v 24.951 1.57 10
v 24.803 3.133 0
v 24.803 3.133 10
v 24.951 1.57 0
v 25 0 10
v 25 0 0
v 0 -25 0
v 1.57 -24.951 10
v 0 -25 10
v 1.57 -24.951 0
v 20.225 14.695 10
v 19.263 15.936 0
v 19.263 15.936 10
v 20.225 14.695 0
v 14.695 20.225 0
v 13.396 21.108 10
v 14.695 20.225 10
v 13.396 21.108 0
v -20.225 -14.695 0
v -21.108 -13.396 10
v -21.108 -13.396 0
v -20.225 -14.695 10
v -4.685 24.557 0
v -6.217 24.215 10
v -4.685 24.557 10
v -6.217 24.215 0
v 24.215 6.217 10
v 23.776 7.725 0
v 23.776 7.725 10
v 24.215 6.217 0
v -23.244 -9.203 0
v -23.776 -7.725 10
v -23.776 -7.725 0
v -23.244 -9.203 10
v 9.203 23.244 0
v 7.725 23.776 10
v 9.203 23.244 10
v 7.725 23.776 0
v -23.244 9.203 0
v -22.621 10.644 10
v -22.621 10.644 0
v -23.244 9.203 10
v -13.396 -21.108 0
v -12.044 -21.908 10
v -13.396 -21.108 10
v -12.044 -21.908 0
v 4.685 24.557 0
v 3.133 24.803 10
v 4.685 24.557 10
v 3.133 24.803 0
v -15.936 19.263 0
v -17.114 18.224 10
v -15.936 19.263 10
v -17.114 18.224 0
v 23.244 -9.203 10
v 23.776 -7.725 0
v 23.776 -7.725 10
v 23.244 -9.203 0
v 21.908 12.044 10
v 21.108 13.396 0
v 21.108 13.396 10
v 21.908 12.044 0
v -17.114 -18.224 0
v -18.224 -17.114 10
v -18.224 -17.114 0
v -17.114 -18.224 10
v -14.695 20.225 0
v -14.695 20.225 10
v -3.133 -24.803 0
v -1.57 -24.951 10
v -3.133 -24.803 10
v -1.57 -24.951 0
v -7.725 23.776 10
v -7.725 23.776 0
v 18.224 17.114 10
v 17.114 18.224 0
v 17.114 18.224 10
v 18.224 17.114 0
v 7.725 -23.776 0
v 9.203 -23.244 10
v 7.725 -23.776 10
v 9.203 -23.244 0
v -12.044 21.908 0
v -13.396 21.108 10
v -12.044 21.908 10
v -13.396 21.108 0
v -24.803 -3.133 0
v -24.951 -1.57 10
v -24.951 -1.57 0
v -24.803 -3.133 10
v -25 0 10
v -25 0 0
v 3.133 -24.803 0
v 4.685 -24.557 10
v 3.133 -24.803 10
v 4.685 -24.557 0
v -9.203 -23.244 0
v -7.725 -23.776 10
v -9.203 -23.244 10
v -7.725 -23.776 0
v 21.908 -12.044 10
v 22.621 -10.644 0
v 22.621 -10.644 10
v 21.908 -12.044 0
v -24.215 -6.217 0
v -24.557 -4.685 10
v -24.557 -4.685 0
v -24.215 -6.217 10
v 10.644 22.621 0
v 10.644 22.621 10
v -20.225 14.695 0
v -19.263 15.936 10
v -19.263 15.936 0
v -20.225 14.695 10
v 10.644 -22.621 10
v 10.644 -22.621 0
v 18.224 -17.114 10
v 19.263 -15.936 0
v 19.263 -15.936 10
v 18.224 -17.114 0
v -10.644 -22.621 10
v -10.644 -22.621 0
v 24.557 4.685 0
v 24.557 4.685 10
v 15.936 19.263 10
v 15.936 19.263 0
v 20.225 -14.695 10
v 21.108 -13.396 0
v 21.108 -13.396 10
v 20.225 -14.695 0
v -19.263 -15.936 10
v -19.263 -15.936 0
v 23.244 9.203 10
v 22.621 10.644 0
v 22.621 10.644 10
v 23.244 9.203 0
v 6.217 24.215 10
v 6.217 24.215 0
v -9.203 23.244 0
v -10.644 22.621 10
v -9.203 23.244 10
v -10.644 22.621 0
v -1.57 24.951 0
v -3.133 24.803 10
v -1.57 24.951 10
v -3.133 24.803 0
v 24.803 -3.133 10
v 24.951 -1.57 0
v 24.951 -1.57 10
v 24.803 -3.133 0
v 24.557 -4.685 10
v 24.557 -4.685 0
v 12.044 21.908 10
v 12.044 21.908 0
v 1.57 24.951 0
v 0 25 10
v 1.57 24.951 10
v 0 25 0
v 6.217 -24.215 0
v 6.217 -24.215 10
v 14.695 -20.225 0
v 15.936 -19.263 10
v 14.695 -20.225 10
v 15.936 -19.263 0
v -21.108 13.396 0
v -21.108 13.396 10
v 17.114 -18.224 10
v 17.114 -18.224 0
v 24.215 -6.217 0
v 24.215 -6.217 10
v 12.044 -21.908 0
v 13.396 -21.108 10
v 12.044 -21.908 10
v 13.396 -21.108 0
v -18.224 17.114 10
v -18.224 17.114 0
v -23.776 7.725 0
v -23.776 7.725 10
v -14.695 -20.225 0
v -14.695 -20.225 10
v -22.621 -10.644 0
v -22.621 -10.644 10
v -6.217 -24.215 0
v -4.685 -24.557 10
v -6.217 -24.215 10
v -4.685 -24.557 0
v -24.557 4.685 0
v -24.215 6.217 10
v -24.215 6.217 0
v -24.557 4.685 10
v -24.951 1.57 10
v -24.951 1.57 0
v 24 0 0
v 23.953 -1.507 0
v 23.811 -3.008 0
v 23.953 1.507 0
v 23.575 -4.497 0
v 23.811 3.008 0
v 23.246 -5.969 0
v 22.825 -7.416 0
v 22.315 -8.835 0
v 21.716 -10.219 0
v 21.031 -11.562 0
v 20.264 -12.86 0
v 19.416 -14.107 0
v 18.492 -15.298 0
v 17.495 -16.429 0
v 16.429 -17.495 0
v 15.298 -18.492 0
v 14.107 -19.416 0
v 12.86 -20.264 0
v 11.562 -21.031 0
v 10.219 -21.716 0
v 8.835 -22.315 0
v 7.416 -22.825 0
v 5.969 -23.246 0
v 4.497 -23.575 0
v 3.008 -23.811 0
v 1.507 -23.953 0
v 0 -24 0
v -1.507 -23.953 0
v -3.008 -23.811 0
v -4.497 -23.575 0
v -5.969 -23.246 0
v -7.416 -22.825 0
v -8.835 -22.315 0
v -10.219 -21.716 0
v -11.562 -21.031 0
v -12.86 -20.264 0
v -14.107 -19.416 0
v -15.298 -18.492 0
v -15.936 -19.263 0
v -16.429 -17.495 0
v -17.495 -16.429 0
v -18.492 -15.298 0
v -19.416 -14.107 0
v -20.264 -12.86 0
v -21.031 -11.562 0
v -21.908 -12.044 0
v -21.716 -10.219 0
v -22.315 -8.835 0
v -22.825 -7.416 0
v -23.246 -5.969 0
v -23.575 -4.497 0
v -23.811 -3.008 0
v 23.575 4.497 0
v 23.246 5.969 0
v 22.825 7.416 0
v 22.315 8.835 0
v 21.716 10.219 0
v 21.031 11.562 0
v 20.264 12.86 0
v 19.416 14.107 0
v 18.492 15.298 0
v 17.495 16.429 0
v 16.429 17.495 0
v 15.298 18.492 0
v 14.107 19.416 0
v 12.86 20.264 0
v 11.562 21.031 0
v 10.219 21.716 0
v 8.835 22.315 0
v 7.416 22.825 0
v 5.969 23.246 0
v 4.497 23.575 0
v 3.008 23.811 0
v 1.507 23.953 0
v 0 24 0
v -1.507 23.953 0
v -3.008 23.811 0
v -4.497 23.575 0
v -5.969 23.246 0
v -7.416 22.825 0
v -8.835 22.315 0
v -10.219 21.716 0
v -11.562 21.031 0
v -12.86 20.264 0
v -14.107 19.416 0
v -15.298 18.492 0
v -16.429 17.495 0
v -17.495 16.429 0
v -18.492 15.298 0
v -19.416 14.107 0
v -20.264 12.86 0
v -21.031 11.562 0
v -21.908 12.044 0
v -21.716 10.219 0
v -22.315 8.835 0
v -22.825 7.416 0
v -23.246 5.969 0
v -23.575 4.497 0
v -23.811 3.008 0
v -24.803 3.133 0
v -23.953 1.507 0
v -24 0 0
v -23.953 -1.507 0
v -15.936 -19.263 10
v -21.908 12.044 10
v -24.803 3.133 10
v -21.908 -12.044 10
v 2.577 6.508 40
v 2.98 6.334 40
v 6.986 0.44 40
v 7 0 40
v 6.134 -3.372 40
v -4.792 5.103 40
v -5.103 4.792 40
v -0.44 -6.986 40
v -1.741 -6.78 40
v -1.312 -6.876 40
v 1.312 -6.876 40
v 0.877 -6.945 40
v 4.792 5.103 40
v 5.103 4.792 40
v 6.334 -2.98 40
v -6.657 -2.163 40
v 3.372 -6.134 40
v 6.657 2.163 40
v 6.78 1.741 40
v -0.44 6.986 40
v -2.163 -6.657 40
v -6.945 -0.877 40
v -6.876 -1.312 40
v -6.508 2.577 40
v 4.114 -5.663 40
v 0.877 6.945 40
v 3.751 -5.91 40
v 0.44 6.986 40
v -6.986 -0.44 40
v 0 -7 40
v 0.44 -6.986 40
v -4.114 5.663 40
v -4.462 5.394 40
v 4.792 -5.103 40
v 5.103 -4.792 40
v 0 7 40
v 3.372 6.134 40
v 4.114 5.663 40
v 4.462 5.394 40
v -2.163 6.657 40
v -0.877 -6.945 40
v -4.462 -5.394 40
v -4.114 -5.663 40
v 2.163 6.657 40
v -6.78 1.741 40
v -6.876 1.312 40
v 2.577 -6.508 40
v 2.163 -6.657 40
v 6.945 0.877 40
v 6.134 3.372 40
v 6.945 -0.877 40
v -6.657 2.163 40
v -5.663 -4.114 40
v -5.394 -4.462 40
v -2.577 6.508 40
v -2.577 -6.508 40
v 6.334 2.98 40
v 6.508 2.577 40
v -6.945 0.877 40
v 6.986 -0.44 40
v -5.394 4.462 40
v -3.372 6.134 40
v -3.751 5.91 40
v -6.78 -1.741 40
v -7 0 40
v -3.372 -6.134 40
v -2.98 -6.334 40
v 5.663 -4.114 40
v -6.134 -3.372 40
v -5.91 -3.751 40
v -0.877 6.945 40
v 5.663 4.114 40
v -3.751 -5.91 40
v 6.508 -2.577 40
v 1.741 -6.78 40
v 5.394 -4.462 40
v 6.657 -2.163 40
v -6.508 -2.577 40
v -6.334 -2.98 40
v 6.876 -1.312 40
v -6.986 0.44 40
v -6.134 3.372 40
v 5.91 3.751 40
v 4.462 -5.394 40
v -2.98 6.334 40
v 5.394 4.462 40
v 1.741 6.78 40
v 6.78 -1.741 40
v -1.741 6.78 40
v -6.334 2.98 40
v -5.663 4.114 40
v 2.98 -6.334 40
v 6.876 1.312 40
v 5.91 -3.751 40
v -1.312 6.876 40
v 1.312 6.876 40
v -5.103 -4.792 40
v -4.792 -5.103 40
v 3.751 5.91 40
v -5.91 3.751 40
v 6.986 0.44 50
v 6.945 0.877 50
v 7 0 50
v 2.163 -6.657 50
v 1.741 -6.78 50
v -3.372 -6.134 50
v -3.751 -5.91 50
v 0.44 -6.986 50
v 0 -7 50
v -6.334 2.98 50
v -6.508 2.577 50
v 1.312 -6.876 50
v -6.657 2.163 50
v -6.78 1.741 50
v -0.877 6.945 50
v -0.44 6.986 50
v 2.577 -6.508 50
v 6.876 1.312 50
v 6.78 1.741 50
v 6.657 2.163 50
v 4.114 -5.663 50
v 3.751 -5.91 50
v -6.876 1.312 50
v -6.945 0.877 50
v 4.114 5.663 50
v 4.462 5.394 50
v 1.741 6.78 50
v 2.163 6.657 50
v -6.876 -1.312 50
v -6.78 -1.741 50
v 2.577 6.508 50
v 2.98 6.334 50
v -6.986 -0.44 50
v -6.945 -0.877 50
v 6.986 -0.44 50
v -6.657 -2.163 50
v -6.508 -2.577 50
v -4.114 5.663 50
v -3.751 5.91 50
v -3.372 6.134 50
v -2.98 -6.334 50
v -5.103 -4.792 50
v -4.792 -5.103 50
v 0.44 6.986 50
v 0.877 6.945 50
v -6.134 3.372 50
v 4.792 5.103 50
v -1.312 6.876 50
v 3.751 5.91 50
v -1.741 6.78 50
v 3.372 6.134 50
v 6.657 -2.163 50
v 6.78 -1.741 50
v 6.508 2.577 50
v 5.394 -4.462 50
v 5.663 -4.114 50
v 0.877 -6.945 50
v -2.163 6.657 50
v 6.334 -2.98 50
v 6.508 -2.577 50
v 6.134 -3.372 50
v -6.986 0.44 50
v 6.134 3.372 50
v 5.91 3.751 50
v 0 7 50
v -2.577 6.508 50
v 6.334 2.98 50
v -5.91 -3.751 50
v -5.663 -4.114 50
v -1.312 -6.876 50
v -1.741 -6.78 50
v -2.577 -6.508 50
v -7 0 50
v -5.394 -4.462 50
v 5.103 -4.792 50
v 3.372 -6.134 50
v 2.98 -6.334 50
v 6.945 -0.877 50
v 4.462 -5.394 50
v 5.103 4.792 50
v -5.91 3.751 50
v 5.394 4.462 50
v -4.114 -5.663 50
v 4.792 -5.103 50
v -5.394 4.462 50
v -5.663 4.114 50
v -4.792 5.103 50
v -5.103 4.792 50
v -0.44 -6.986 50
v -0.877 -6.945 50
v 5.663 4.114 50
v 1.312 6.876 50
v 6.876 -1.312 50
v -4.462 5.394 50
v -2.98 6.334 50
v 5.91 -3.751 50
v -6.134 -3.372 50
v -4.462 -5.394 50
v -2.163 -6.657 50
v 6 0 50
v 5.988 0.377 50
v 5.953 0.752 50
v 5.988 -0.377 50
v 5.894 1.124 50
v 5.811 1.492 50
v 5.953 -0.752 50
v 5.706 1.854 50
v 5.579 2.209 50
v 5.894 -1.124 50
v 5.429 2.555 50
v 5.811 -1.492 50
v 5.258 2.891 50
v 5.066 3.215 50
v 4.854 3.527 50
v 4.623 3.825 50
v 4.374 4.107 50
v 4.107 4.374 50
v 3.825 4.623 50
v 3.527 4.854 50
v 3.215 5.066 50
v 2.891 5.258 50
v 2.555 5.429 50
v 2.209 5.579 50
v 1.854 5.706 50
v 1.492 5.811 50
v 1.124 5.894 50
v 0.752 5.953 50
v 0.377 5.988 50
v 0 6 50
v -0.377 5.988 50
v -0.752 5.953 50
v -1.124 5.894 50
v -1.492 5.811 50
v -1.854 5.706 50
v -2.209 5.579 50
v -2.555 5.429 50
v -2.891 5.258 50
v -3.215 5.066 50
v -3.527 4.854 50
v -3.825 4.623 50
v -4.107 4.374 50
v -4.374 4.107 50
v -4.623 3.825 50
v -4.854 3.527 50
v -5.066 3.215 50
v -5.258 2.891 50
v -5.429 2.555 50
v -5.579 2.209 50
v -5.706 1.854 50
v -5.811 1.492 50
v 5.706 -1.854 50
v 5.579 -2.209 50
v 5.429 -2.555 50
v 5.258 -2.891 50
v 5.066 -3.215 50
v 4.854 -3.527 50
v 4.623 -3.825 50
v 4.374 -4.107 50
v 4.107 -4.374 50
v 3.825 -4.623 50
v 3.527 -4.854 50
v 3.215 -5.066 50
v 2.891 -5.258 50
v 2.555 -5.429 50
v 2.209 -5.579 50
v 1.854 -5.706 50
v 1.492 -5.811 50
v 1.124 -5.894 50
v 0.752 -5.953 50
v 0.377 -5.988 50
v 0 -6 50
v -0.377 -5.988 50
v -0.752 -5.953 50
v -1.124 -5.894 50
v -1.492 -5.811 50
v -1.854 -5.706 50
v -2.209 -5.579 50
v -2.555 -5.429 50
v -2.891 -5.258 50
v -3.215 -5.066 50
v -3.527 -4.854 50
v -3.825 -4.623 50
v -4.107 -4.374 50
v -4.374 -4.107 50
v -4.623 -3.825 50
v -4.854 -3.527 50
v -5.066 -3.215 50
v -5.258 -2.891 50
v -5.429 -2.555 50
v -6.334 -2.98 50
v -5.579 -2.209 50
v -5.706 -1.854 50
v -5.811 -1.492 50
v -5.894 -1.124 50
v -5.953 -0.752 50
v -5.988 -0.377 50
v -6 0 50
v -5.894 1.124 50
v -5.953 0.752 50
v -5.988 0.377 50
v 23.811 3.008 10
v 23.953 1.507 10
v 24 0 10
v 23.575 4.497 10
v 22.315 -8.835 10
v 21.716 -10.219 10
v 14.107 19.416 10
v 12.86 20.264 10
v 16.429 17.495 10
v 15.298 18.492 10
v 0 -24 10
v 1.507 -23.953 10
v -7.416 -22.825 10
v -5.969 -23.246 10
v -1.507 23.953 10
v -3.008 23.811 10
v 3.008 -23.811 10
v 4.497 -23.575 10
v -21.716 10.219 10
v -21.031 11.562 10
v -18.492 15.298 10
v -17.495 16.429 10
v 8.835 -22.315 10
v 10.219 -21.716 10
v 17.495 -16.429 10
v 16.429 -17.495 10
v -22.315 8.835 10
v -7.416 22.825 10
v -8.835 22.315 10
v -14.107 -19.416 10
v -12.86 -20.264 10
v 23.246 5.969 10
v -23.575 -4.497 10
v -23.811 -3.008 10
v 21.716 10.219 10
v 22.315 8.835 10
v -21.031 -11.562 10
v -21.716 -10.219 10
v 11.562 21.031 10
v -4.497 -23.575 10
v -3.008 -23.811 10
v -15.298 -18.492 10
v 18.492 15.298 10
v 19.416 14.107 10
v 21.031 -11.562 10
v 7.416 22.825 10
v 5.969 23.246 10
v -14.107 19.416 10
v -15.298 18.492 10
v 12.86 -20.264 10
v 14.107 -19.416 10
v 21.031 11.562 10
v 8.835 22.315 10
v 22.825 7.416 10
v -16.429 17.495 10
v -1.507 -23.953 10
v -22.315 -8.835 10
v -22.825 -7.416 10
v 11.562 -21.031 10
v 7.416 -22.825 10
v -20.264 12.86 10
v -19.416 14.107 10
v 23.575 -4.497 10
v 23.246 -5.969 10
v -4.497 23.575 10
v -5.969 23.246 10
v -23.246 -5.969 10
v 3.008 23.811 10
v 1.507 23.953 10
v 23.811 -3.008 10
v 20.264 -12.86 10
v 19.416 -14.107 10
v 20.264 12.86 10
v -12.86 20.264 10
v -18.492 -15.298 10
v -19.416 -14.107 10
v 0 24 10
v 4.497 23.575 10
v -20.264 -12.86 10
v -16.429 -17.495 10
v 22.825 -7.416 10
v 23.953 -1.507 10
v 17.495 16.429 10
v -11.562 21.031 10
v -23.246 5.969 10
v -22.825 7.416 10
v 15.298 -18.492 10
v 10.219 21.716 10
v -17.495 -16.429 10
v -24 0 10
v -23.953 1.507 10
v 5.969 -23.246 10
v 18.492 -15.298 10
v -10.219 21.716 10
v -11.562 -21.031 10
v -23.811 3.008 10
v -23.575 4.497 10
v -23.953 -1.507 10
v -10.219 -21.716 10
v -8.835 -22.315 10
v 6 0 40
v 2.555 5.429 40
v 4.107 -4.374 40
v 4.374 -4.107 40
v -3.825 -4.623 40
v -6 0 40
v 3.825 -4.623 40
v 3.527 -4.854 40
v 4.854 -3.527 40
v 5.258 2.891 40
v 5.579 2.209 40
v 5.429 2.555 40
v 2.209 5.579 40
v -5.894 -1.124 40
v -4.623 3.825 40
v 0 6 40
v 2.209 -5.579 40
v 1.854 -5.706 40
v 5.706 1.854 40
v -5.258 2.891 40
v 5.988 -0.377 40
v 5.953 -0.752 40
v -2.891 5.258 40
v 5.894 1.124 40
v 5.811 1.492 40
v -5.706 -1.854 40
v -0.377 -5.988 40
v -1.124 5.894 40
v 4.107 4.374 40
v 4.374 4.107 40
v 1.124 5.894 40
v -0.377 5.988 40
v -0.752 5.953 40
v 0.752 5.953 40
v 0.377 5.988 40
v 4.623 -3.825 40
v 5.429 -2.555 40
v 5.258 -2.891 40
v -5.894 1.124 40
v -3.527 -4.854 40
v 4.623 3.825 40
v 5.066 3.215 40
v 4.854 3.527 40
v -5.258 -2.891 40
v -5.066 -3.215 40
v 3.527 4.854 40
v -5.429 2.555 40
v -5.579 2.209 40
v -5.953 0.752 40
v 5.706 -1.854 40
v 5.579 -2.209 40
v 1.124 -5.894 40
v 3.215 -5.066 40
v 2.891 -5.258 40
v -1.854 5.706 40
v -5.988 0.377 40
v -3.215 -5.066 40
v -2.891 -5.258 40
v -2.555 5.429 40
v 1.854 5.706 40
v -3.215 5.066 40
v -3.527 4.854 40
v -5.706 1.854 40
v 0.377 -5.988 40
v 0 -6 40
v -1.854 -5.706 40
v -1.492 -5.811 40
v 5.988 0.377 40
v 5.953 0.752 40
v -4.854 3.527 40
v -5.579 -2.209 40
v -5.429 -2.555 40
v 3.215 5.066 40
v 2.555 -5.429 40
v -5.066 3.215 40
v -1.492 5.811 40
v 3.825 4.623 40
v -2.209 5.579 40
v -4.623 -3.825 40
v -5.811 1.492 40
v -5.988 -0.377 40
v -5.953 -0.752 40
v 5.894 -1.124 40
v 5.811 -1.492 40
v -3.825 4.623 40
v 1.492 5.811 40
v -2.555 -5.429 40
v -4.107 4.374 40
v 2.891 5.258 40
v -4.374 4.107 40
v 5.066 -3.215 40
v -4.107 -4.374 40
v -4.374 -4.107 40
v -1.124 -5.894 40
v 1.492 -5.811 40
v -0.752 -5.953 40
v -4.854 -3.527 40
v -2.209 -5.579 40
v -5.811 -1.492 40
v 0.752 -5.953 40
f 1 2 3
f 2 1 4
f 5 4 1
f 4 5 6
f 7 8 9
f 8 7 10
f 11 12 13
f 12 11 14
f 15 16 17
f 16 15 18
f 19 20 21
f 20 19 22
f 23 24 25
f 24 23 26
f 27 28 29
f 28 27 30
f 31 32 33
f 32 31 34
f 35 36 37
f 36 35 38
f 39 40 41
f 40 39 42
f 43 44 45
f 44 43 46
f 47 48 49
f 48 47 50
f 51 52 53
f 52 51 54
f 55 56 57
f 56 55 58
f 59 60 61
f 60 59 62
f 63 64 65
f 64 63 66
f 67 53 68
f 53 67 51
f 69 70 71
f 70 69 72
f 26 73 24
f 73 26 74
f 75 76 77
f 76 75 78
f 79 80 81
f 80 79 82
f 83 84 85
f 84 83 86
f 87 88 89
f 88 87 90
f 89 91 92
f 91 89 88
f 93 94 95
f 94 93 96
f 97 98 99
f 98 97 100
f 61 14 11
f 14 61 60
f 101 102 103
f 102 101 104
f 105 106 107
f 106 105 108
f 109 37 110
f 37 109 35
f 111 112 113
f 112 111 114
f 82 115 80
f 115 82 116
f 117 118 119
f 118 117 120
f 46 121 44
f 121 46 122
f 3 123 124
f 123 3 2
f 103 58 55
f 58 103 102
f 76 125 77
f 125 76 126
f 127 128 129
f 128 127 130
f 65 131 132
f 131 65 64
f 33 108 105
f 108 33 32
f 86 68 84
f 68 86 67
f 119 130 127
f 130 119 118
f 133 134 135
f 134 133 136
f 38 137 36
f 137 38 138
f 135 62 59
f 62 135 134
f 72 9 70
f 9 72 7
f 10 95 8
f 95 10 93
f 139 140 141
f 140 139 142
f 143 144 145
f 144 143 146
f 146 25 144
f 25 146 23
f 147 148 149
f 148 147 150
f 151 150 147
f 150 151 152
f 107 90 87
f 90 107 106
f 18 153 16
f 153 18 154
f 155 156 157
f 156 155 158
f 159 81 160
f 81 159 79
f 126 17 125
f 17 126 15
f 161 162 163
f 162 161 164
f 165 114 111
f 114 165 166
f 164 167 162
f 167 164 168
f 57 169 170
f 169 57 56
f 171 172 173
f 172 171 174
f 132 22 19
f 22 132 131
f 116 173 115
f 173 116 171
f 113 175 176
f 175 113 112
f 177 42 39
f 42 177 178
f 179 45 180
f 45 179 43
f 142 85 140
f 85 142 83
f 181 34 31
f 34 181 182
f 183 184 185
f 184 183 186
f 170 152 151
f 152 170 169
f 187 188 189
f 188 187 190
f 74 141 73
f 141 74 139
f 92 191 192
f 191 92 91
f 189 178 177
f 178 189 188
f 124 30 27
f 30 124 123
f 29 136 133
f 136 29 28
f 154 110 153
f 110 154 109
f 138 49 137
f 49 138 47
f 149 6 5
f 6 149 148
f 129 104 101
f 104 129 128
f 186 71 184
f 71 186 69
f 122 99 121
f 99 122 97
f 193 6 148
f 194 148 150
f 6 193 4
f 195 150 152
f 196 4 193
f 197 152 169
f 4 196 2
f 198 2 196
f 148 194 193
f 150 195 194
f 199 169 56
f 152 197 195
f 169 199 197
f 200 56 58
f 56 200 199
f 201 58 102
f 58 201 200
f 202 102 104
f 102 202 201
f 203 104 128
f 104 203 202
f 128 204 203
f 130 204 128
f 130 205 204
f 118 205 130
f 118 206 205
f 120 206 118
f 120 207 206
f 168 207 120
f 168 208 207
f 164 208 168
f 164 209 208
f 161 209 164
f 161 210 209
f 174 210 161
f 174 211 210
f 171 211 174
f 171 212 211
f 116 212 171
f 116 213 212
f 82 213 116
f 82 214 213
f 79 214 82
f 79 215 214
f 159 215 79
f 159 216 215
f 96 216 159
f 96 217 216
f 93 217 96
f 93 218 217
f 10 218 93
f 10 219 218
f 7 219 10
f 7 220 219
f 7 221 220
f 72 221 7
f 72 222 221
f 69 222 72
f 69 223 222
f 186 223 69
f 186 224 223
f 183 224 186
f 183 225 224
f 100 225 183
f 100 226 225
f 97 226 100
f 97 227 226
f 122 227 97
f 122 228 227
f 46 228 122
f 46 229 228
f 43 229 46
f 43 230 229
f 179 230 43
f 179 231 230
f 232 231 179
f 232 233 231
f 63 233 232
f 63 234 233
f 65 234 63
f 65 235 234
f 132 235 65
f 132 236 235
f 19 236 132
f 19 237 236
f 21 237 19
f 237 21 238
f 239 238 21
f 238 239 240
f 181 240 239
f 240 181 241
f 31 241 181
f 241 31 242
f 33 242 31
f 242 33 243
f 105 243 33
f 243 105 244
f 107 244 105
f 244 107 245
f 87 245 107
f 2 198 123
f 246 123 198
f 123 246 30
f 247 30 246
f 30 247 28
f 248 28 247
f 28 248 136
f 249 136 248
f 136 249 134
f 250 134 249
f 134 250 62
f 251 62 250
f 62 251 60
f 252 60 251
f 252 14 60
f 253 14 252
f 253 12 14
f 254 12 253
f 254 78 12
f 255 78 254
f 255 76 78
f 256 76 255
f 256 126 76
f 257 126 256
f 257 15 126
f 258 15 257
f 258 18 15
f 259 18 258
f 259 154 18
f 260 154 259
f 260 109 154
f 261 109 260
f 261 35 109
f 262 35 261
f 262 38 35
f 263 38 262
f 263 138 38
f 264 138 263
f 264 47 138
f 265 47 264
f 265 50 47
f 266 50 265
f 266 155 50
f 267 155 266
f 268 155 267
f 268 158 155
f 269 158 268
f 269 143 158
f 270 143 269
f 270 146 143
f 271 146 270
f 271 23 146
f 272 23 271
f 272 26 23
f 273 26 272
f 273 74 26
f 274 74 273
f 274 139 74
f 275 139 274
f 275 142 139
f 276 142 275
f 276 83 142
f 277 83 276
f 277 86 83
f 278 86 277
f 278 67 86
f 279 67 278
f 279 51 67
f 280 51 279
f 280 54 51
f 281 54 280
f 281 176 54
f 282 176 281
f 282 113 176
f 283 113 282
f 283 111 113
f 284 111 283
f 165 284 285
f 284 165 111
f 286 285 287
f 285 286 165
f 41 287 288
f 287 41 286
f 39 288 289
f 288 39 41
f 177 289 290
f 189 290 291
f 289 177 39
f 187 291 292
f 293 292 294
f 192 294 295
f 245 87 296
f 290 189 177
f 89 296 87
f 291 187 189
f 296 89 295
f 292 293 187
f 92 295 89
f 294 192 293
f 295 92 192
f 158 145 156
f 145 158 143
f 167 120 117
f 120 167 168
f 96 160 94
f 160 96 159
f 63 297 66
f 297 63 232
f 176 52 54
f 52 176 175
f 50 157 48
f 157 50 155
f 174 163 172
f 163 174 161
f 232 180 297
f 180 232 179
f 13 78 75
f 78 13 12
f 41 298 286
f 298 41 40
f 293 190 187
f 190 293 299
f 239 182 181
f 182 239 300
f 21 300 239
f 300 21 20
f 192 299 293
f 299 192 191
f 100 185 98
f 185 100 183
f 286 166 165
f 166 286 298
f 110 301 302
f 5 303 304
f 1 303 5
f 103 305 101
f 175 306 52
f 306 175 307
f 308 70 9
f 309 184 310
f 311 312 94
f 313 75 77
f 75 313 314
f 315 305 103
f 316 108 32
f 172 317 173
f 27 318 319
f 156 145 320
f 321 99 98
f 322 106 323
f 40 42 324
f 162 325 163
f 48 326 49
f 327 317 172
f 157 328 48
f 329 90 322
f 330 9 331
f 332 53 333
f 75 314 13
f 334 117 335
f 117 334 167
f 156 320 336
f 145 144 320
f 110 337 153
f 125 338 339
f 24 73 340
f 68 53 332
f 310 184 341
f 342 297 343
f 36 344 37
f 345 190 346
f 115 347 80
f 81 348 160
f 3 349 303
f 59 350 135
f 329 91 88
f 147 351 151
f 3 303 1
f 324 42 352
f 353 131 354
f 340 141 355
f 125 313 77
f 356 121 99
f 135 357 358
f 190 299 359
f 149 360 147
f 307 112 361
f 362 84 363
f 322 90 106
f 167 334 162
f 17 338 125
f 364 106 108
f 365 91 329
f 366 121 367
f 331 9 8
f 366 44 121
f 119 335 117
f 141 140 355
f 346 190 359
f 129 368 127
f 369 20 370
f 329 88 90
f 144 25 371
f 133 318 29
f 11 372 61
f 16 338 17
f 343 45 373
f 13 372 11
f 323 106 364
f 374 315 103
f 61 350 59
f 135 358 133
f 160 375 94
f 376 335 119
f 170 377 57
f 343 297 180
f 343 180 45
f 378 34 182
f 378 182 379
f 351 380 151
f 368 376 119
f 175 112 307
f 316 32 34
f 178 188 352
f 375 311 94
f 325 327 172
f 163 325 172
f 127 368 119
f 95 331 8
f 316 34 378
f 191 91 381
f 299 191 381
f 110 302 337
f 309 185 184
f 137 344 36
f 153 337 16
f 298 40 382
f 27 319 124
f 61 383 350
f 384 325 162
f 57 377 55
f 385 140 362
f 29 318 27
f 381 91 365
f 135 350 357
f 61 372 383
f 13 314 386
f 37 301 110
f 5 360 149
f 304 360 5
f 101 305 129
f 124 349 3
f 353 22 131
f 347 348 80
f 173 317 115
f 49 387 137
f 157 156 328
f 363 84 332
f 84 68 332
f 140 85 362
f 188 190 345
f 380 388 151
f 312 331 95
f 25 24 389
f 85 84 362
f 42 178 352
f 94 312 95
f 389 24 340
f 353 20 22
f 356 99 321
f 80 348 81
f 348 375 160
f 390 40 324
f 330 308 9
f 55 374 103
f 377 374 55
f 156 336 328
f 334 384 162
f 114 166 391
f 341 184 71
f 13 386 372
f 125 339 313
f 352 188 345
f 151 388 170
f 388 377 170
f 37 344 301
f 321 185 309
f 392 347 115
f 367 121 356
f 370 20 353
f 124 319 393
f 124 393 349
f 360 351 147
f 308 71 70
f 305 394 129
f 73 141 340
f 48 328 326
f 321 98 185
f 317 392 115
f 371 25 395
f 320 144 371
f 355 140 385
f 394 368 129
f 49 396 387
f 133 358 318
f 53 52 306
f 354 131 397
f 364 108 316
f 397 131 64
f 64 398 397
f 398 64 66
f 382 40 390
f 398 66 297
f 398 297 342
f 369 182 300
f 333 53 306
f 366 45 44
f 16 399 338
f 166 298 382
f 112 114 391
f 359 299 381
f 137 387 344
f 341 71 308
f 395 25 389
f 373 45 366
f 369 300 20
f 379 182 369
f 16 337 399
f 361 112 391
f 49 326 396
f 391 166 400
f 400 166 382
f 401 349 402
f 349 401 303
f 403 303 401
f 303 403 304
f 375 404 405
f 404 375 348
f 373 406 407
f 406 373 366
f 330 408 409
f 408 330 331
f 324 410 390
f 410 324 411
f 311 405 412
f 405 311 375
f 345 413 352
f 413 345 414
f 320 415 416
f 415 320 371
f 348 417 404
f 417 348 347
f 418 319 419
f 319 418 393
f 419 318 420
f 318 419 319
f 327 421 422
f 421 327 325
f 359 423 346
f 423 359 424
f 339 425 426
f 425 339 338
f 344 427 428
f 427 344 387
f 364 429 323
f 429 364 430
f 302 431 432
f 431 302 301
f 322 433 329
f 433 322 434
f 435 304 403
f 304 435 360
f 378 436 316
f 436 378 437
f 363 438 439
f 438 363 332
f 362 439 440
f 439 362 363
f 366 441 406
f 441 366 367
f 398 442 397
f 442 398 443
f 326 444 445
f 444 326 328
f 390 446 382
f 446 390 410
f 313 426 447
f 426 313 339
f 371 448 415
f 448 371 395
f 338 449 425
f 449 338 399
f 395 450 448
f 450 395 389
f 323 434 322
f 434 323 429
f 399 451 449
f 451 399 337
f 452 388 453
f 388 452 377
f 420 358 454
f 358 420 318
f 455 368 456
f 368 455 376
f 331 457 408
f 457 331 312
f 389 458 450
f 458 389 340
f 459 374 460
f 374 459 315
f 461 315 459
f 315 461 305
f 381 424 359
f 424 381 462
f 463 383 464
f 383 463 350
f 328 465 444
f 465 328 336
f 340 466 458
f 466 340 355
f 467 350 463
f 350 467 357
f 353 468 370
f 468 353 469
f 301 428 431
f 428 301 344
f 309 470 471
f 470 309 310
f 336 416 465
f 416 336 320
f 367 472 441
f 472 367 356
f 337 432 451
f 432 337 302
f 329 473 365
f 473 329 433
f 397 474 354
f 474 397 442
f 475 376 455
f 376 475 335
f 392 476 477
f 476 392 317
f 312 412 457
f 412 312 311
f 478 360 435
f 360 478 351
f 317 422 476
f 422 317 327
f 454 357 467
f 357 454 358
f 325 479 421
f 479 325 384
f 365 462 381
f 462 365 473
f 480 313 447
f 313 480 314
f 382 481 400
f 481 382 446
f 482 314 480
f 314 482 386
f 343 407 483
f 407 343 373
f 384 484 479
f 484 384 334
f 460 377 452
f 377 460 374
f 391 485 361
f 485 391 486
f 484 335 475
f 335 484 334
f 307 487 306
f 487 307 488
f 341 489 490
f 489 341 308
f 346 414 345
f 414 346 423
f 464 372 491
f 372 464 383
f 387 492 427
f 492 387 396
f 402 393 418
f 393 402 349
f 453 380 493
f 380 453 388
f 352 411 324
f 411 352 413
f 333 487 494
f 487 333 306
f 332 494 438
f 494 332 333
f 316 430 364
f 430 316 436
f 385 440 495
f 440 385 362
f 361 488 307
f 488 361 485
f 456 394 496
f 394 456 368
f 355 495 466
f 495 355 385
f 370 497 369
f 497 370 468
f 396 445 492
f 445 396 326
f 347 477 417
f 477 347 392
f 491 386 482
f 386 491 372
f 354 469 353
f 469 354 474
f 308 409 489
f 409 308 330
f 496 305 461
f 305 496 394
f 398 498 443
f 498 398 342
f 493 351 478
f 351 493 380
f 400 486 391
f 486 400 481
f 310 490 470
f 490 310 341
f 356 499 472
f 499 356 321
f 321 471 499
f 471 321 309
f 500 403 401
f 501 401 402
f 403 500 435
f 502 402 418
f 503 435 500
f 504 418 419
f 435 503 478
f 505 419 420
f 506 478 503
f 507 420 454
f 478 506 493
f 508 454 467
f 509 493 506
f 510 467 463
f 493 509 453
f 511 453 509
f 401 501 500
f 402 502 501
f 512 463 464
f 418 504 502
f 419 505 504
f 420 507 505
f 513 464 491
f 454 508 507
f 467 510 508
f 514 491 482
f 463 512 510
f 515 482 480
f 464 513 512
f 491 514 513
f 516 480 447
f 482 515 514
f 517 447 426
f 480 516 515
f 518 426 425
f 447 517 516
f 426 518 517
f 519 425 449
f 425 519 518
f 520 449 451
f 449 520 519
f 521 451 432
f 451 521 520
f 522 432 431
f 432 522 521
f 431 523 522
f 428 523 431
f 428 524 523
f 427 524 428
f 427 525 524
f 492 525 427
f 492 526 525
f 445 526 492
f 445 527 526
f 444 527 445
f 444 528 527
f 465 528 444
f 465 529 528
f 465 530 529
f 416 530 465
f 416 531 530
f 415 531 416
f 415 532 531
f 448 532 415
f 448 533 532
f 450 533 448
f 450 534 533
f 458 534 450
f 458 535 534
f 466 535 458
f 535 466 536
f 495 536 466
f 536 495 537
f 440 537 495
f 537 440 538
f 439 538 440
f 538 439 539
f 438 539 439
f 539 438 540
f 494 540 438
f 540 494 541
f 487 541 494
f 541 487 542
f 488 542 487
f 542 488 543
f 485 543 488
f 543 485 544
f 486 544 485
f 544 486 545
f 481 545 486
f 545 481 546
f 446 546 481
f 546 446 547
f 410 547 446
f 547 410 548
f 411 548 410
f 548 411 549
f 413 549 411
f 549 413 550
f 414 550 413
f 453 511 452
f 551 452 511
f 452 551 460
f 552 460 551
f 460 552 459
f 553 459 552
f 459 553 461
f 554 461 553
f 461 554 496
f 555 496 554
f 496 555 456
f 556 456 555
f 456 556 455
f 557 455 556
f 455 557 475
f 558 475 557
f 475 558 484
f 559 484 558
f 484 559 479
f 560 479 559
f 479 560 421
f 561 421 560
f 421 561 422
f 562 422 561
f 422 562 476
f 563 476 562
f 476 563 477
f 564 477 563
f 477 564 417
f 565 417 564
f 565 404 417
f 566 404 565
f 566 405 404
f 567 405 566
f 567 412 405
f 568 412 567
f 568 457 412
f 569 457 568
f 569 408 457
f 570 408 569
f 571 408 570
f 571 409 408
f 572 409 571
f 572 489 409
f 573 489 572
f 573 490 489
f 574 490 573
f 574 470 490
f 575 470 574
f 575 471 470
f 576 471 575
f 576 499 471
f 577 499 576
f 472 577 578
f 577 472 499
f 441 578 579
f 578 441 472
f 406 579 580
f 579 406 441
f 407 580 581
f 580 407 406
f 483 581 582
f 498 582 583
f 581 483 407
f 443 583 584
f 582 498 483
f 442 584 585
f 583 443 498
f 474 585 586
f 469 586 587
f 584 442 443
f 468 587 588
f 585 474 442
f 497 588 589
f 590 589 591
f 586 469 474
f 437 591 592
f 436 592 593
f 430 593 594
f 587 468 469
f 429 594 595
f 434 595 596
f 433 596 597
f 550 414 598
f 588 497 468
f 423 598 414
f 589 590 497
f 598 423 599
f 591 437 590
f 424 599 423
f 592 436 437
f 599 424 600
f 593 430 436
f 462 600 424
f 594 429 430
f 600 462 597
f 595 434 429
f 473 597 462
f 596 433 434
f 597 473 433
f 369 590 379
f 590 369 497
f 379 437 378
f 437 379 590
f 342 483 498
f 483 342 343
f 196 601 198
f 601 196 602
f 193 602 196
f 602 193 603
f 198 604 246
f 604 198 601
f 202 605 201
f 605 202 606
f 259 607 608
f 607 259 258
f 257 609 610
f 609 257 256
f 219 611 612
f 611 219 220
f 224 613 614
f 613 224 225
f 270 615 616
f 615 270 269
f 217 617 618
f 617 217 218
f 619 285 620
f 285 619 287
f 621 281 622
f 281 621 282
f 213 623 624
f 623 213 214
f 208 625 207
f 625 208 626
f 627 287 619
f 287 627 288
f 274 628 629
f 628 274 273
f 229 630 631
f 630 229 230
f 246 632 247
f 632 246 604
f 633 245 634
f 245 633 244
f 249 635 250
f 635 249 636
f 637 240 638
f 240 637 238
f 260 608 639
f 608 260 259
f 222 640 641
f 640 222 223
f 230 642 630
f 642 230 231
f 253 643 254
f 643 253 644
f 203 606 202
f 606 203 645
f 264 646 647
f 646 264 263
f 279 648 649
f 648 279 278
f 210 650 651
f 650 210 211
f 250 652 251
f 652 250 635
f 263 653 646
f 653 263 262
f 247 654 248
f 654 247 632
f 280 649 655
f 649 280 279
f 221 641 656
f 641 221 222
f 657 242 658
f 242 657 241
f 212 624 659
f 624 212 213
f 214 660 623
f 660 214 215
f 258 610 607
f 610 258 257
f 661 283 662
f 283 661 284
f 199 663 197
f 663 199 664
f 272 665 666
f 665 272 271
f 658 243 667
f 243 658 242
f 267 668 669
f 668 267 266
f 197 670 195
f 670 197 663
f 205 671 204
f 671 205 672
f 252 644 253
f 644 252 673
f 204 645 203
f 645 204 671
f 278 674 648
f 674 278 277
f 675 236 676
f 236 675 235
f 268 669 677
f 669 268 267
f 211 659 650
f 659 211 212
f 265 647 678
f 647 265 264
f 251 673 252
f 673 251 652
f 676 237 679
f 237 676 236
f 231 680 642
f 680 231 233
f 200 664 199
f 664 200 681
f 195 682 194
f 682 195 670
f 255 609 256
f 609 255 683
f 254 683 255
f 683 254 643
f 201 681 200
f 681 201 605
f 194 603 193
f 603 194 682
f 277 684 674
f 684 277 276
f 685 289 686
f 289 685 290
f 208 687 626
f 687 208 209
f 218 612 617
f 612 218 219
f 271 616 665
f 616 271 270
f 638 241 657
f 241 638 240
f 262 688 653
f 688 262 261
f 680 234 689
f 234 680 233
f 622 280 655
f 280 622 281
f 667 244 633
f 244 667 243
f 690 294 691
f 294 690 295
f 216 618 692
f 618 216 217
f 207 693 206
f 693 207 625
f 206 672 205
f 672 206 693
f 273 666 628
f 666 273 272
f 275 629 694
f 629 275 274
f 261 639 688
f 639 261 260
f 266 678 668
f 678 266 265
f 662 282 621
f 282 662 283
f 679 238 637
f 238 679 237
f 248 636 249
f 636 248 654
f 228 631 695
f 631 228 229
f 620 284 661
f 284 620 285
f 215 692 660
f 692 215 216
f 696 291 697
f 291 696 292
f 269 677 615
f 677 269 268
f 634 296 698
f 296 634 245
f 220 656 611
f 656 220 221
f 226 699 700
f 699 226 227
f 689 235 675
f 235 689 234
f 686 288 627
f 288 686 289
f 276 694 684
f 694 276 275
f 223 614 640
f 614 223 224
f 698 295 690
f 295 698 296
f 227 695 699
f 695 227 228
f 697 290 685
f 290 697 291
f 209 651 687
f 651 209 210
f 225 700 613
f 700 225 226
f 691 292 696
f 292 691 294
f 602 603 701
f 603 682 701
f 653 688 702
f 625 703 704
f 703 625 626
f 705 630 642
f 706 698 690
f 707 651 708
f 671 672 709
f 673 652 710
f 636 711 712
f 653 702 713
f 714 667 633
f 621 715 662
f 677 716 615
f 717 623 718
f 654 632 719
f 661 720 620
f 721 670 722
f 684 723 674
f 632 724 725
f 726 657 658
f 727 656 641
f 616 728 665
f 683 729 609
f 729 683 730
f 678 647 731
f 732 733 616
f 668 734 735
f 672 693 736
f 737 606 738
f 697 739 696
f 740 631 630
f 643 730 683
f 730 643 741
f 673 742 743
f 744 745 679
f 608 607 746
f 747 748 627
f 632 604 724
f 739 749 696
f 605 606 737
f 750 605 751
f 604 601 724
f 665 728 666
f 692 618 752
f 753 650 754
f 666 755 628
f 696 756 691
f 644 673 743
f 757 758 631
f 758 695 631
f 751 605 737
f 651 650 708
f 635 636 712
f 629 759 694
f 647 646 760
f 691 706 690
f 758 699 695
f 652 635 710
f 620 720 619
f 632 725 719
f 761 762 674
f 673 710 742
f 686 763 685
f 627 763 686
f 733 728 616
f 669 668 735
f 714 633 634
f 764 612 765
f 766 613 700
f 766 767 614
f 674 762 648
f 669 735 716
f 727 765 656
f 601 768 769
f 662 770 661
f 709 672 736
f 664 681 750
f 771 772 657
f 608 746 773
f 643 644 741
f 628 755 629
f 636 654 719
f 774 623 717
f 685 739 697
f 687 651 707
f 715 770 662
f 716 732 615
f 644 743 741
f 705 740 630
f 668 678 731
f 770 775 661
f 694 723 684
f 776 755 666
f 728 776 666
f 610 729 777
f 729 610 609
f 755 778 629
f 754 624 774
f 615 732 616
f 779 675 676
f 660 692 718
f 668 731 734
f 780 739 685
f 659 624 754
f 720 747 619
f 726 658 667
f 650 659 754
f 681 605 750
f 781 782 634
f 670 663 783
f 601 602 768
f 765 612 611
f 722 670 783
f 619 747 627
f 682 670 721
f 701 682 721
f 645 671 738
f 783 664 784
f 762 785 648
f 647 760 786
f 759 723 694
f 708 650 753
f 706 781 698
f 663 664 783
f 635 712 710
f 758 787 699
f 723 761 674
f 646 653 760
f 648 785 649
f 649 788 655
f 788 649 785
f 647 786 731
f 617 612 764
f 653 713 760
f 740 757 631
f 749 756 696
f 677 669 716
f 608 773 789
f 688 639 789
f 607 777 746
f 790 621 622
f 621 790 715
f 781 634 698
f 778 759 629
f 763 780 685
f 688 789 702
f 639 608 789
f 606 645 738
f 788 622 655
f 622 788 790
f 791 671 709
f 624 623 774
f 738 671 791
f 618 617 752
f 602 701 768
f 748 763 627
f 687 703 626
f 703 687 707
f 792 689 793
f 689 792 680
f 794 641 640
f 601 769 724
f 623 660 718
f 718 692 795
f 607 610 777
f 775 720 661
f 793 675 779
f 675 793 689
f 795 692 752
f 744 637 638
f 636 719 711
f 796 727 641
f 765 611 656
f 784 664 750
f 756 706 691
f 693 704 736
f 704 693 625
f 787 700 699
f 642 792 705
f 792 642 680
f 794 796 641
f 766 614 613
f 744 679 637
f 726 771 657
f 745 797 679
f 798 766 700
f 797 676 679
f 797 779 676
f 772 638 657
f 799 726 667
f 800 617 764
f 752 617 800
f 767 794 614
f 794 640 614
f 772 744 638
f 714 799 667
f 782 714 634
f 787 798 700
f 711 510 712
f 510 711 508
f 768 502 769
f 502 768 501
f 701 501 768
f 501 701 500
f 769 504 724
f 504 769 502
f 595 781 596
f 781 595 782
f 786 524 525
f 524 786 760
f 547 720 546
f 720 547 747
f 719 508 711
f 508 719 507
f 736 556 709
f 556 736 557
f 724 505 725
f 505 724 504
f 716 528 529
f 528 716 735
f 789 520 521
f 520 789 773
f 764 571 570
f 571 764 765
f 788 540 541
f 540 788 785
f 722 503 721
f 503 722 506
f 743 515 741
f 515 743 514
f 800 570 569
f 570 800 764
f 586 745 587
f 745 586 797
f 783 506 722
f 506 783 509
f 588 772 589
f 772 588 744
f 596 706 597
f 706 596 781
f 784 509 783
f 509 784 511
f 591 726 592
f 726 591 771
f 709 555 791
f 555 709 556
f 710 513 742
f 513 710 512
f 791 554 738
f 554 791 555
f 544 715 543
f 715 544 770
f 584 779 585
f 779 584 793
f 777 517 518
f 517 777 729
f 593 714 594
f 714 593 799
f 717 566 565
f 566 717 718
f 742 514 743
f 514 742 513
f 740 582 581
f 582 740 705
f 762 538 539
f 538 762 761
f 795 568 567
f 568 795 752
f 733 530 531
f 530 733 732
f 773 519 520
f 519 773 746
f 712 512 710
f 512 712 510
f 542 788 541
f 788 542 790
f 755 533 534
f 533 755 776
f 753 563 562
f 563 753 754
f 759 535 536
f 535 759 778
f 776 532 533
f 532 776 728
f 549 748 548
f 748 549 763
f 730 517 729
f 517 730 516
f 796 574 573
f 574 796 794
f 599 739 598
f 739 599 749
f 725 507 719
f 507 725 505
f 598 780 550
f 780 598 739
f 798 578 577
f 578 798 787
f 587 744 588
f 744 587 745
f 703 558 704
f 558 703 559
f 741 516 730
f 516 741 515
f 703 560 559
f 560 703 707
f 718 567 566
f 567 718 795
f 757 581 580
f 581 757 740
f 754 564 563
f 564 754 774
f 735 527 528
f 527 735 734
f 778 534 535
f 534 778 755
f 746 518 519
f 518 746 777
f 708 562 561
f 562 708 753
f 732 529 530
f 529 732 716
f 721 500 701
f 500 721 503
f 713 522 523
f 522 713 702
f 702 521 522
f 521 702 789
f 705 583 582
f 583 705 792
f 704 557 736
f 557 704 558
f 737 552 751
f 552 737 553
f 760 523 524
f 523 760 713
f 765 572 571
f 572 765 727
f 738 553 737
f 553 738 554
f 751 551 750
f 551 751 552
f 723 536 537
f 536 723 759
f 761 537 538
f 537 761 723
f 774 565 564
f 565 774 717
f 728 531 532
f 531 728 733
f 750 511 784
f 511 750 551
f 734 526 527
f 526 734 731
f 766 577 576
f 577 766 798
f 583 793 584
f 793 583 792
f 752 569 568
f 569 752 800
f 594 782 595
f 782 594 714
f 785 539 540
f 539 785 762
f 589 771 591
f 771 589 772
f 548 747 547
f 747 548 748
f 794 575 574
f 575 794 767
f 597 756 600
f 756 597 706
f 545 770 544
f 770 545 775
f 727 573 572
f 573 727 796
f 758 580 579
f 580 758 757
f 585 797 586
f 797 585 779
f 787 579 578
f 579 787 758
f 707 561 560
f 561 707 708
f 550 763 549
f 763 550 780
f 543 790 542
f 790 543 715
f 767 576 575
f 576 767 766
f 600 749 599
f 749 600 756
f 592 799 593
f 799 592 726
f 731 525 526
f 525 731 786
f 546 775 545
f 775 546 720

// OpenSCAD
// Funnel 3D model
// Small radius: 7mm
// Large radius: 25mm

// Parameters
small_radius = 7;  // Small end radius in mm
large_radius = 25; // Large end radius in mm
height = 40;       // Total height of the funnel
thickness = 1;     // Wall thickness
transition_height = 30; // Height of the conical transition section
small_tube_height = 10; // Height of the small tube extension

// Main funnel module
module funnel() {
    difference() {
        // Outer shape
        union() {
            // Top cylinder (large end)
            cylinder(h=height-transition_height, r=large_radius, $fn=100);
            
            // Transition cone
            translate([0, 0, height-transition_height])
                cylinder(h=transition_height, r1=large_radius, r2=small_radius, $fn=100);
            
            // Small tube extension
            translate([0, 0, height])
                cylinder(h=small_tube_height, r=small_radius, $fn=100);
        }
        
        // Inner cutout
        union() {
            // Top cylinder cutout
            translate([0, 0, thickness])
                cylinder(h=height-transition_height-thickness, r=large_radius-thickness, $fn=100);
            
            // Transition cone cutout
            translate([0, 0, height-transition_height])
                cylinder(h=transition_height, r1=large_radius-thickness, r2=small_radius-thickness, $fn=100);
            
            // Small tube cutout
            translate([0, 0, height])
                cylinder(h=small_tube_height, r=small_radius-thickness, $fn=100);
            
            // Bottom opening (if enabled)
            translate([0, 0, ])
                cylinder(h=thickness+1, r=large_radius-thickness, $fn=100);
        }
    }
}

// Render the funnel
funnel();
